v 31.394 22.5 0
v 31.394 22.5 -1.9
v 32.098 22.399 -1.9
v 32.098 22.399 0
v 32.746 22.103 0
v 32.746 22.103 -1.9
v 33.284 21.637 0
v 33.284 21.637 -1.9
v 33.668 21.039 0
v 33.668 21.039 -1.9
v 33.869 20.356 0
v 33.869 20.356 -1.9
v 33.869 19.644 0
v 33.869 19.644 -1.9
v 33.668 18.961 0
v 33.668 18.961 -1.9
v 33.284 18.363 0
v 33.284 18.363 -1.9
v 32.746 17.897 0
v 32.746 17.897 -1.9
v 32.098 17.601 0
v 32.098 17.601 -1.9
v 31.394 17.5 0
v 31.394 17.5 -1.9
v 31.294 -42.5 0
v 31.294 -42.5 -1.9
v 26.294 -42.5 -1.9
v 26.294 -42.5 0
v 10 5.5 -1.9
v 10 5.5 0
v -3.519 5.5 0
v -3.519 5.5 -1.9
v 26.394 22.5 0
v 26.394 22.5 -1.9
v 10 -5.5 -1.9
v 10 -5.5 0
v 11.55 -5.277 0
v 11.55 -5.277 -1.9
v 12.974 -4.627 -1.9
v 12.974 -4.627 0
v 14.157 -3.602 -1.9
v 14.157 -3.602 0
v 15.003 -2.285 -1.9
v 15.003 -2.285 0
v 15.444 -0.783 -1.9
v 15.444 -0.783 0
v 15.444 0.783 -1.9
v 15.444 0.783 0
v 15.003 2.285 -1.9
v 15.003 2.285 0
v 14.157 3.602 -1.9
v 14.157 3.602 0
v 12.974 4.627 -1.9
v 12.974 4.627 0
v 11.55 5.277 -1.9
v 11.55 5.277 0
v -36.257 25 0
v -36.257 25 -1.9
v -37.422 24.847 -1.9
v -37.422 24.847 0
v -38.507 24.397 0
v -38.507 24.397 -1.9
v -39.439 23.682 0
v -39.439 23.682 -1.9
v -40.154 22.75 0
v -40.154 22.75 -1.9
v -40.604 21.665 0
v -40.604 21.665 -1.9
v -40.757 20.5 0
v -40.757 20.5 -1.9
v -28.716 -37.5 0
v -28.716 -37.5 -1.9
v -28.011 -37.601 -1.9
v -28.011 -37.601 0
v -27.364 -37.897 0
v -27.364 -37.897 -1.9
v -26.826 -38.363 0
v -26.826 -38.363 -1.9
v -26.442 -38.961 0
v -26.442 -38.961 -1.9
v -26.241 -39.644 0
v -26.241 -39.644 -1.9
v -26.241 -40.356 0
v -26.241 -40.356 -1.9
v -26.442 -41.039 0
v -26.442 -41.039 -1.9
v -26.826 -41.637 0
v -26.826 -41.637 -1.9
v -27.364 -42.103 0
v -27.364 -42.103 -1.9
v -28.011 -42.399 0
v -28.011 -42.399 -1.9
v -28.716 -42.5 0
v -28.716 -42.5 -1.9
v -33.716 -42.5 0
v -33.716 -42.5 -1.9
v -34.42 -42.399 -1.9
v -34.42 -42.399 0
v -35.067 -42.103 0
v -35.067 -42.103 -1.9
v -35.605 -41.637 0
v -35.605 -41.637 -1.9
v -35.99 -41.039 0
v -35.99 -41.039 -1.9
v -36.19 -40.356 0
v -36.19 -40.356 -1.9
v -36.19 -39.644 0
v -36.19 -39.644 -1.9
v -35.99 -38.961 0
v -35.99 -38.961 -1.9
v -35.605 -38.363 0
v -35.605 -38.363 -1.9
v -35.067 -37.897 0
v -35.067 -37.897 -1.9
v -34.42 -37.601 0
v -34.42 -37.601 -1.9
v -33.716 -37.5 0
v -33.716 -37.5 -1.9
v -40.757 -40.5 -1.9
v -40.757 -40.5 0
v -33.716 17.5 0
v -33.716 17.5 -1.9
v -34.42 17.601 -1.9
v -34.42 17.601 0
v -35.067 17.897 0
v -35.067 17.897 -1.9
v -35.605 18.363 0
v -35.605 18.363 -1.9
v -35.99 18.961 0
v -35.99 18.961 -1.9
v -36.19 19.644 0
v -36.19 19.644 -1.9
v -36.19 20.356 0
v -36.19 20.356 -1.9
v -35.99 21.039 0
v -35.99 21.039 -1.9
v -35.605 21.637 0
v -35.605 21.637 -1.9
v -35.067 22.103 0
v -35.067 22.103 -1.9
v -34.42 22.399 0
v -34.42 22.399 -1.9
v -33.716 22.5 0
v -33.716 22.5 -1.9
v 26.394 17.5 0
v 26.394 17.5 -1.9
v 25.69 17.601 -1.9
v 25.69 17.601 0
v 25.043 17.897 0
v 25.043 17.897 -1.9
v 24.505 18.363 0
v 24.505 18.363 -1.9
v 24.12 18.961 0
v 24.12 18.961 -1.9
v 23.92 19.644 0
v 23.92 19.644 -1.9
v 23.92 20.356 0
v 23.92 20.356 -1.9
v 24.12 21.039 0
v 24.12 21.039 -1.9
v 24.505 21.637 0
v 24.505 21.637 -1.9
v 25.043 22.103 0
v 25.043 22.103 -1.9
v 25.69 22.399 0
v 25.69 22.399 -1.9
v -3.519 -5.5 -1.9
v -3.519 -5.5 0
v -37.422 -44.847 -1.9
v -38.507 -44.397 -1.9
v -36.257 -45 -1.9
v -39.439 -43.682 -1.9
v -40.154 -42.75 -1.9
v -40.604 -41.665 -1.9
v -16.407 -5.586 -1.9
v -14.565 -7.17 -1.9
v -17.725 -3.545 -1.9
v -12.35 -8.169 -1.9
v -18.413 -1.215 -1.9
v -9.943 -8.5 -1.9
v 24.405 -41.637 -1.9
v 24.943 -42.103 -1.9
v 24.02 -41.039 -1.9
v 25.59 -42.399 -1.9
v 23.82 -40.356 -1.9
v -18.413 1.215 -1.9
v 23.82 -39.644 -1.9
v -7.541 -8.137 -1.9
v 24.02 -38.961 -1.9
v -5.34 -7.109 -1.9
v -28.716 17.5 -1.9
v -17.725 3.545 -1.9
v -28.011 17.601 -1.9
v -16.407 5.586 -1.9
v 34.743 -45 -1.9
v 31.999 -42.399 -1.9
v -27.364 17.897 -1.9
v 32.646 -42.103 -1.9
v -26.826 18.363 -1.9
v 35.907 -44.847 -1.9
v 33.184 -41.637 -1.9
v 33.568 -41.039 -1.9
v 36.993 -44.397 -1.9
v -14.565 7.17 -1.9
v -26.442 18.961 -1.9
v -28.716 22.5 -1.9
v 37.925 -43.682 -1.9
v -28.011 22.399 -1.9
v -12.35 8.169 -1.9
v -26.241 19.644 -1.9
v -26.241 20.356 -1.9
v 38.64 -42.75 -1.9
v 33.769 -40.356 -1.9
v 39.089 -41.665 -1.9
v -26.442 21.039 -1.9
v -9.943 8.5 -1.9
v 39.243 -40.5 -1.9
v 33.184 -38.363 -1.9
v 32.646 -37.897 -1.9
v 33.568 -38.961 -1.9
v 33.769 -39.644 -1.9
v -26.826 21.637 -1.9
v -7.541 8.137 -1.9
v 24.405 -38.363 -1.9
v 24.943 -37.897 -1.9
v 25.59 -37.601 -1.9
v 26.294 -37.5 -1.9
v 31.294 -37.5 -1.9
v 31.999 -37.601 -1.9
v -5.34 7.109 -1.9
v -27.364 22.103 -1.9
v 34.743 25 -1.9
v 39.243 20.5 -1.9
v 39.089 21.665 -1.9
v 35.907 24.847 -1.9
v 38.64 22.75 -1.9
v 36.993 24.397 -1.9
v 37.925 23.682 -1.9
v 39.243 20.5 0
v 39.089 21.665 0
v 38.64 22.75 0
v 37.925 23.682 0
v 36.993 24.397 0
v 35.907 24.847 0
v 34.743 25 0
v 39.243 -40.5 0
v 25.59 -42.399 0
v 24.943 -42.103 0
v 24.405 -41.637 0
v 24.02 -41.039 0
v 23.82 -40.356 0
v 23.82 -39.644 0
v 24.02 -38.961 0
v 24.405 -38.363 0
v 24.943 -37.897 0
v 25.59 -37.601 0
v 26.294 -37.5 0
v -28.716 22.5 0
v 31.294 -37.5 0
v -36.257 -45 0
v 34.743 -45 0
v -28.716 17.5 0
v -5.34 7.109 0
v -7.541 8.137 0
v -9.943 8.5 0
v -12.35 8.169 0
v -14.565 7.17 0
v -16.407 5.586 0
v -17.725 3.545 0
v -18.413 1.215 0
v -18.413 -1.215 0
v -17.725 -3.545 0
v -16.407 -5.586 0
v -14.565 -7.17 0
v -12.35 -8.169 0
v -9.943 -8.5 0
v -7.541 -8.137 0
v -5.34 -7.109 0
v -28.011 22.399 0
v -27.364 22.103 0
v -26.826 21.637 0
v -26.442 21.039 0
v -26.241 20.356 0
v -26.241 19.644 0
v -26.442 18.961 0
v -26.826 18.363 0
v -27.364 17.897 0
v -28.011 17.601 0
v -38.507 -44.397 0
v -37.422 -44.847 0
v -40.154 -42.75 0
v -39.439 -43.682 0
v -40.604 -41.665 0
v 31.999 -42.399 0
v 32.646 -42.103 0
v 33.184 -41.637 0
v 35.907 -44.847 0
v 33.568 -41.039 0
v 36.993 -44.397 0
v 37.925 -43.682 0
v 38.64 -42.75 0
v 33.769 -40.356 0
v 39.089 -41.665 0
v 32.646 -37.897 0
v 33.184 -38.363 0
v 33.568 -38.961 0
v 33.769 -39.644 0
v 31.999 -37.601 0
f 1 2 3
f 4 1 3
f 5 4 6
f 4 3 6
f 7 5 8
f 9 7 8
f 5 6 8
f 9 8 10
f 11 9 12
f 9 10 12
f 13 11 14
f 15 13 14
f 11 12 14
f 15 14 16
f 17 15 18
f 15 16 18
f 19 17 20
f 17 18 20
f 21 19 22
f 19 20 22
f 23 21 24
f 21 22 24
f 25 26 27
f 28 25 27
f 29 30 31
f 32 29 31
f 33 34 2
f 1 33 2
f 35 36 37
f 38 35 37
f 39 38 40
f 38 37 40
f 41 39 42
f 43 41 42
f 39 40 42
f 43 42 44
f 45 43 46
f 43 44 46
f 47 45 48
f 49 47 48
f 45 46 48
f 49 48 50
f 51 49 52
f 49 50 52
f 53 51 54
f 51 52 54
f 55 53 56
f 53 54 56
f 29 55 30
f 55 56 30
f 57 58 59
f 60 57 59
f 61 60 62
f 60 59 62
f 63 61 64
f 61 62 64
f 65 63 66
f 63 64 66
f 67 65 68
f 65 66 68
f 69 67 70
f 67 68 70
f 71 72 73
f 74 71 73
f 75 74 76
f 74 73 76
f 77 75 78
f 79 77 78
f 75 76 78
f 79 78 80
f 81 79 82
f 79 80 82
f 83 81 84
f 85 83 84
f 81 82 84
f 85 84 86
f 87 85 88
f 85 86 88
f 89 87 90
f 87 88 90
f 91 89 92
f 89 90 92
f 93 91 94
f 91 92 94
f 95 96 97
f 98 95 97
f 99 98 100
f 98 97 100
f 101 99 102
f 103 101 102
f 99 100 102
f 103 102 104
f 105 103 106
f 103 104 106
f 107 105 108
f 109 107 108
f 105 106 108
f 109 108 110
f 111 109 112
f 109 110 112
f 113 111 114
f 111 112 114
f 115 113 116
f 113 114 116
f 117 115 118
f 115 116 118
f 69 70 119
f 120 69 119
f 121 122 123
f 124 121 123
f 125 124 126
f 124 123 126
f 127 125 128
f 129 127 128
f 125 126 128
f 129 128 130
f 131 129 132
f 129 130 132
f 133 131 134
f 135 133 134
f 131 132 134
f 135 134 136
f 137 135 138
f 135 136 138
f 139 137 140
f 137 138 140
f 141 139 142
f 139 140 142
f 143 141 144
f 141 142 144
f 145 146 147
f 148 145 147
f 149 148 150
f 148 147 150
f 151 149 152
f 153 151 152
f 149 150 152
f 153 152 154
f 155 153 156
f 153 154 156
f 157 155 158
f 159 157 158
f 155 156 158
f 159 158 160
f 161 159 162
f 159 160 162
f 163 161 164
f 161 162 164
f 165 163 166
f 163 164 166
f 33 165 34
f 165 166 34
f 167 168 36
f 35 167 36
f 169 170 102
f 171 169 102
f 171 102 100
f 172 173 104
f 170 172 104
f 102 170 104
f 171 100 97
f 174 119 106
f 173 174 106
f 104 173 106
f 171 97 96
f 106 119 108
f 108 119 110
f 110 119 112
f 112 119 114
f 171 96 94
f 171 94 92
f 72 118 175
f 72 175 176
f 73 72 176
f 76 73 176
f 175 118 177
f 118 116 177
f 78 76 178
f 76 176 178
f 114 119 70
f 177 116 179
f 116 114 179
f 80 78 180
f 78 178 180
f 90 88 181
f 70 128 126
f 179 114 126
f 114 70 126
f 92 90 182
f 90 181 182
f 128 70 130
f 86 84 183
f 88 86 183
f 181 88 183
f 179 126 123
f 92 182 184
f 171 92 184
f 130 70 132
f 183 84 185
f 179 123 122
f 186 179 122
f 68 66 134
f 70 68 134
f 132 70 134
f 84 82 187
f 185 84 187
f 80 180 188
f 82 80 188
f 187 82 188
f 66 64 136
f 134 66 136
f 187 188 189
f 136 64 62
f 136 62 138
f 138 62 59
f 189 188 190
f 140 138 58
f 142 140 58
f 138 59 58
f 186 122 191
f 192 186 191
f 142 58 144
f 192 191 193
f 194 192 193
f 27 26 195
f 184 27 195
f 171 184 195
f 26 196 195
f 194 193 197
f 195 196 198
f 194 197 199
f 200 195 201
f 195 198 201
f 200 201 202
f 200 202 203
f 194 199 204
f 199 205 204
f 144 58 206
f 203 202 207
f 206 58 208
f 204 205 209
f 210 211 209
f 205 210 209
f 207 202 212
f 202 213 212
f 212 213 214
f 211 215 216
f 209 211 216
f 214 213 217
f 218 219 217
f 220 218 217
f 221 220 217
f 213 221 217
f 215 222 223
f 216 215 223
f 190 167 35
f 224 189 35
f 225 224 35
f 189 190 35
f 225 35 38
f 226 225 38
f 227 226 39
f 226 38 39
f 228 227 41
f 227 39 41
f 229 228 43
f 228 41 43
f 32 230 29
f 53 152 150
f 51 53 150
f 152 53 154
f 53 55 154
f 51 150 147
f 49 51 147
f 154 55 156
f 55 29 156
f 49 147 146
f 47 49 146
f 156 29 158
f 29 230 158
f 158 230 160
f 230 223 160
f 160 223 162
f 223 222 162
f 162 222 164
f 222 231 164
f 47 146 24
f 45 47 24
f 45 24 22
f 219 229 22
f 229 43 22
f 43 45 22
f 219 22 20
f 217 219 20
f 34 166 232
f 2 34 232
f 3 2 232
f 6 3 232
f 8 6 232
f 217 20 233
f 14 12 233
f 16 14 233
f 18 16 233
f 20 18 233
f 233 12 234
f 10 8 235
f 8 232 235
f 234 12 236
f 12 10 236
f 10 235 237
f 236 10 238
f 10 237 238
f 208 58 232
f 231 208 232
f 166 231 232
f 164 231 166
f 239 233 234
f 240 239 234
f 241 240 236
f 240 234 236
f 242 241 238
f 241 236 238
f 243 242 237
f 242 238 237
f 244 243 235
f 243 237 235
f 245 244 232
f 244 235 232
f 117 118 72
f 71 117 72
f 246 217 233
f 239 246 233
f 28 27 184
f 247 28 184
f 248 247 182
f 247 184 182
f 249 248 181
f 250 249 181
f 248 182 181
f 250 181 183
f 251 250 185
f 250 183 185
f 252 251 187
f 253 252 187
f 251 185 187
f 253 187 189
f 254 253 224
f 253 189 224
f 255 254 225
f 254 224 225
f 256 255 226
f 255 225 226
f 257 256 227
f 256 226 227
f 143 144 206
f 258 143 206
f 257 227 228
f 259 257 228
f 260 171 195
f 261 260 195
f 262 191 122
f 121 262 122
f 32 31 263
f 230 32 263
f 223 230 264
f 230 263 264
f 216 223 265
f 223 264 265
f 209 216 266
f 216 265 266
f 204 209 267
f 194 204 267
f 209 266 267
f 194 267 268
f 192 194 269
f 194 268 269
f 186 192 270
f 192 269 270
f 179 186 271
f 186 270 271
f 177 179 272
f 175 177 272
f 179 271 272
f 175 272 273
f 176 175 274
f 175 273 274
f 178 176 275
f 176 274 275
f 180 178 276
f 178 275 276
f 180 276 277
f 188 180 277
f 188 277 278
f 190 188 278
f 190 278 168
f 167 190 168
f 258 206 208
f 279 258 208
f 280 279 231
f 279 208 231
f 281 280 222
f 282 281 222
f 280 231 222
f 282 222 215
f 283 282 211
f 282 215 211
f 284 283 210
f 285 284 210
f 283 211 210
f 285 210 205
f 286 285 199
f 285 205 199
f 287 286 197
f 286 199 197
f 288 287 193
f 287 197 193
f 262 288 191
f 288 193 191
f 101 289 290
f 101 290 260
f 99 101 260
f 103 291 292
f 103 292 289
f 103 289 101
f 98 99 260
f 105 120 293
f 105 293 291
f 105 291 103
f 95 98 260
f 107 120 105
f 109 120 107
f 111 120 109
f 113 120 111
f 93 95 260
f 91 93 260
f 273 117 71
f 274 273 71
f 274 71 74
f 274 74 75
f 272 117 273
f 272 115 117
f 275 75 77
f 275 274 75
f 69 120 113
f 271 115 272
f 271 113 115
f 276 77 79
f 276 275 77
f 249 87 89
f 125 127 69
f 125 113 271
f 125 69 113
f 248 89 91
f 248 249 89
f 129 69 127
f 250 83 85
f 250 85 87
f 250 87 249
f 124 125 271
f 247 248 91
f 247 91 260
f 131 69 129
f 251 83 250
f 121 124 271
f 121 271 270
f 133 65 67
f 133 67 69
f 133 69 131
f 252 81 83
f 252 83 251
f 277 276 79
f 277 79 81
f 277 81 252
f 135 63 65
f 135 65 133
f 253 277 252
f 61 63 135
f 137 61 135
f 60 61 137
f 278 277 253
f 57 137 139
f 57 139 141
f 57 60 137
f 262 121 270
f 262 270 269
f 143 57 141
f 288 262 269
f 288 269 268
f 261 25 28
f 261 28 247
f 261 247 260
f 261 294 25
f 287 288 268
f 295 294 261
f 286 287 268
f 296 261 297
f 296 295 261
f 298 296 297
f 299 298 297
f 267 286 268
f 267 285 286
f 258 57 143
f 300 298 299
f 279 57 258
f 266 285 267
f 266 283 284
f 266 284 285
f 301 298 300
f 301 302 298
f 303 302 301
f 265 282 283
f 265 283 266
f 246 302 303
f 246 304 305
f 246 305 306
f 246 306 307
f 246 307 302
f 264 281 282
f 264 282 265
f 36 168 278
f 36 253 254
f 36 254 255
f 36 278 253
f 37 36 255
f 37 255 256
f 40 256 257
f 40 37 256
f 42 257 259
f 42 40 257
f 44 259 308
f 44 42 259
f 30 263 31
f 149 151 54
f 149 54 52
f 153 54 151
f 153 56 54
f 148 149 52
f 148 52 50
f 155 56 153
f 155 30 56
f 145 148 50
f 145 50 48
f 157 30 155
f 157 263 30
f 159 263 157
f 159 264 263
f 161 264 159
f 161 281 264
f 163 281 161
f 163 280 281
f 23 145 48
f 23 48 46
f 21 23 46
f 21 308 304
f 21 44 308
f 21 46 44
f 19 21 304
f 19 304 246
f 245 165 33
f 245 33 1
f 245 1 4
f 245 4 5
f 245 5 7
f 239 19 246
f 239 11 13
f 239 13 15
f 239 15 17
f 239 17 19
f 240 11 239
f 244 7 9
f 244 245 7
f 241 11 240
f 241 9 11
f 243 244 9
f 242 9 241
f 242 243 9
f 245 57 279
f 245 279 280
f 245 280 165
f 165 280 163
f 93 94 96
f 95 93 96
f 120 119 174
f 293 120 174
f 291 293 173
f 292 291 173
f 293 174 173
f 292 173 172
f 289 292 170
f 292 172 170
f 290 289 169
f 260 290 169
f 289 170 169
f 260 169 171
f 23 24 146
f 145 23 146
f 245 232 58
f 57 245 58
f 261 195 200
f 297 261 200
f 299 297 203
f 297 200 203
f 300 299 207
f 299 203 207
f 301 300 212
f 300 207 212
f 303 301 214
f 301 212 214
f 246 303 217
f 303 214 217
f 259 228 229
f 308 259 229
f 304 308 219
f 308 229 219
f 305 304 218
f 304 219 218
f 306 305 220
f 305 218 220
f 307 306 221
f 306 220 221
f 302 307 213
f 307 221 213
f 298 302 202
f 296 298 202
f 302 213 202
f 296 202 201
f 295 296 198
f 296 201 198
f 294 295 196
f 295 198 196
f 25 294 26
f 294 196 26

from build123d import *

# Parameters (mm, degrees)
BASE_FLANGE1_START = -1.9
BASE_FLANGE1_DEPTH = 1.9
CUT_EXTRUDE1_DEPTH = 10


# Read off the part's stored shape, not the designer's step: Base-Flange1
with BuildPart() as part:
    # Base-Flange1 outline → Base-Flange1 (new body)
    with BuildSketch(Plane.XY.offset(BASE_FLANGE1_START)):
        with BuildLine():
            Line((39.242670298, -40.5), (39.242670298, 20.5))
            ThreePointArc((39.242670298, 20.5), (37.924650813, 23.681980515), (34.742670298, 25))
            Line((34.742670298, 25), (-36.257329702, 25))
            ThreePointArc((-36.257329702, 25), (-39.439310218, 23.681980516), (-40.757329702, 20.5))
            Line((-40.757329702, 20.5), (-40.757329702, -40.5))
            ThreePointArc((-40.757329702, -40.5), (-39.439310218, -43.681980516), (-36.257329702, -45))
            Line((-36.257329702, -45), (34.742670298, -45))
            ThreePointArc((34.742670298, -45), (37.924650813, -43.681980515), (39.242670298, -40.5))
        make_face()
        with BuildLine():
            ThreePointArc((-33.7157381, -42.5), (-36.2157381, -40), (-33.7157381, -37.5))
            Line((-33.7157381, -37.5), (-28.7157381, -37.5))
            ThreePointArc((-28.7157381, -37.5), (-26.2157381, -40), (-28.7157381, -42.5))
            Line((-28.7157381, -42.5), (-33.7157381, -42.5))
        make_face(mode=Mode.SUBTRACT)
        with BuildLine():
            ThreePointArc((26.2942619, -42.5), (23.7942619, -40), (26.2942619, -37.5))
            Line((26.2942619, -37.5), (31.2942619, -37.5))
            ThreePointArc((31.2942619, -37.5), (33.7942619, -40), (31.2942619, -42.5))
            Line((31.2942619, -42.5), (26.2942619, -42.5))
        make_face(mode=Mode.SUBTRACT)
        with BuildLine():
            ThreePointArc((-33.7157381, 17.5), (-36.2157381, 20), (-33.7157381, 22.5))
            Line((-33.7157381, 22.5), (-28.7157381, 22.5))
            ThreePointArc((-28.7157381, 22.5), (-26.2157381, 20), (-28.7157381, 17.5))
            Line((-28.7157381, 17.5), (-33.7157381, 17.5))
        make_face(mode=Mode.SUBTRACT)
        with BuildLine():
            ThreePointArc((26.394136238, 17.5), (23.894136238, 20), (26.394136238, 22.5))
            Line((26.394136238, 22.5), (31.394136238, 22.5))
            ThreePointArc((31.394136238, 22.5), (33.894136238, 20), (31.394136238, 17.5))
            Line((31.394136238, 17.5), (26.394136238, 17.5))
        make_face(mode=Mode.SUBTRACT)
    extrude(amount=BASE_FLANGE1_DEPTH)

    # Sketch6 → Cut-Extrude1 (cut)
    with BuildSketch(Plane.XY):
        with BuildLine():
            Line((10, 5.5), (-3.519259302, 5.5))
            ThreePointArc((-3.519259302, 5.5), (-18.5, 0), (-3.519259302, -5.5))
            Line((-3.519259302, -5.5), (10, -5.5))
            ThreePointArc((10, -5.5), (15.5, 0), (10, 5.5))
        make_face()
    extrude(amount=-CUT_EXTRUDE1_DEPTH, mode=Mode.SUBTRACT)


solid = part.part
